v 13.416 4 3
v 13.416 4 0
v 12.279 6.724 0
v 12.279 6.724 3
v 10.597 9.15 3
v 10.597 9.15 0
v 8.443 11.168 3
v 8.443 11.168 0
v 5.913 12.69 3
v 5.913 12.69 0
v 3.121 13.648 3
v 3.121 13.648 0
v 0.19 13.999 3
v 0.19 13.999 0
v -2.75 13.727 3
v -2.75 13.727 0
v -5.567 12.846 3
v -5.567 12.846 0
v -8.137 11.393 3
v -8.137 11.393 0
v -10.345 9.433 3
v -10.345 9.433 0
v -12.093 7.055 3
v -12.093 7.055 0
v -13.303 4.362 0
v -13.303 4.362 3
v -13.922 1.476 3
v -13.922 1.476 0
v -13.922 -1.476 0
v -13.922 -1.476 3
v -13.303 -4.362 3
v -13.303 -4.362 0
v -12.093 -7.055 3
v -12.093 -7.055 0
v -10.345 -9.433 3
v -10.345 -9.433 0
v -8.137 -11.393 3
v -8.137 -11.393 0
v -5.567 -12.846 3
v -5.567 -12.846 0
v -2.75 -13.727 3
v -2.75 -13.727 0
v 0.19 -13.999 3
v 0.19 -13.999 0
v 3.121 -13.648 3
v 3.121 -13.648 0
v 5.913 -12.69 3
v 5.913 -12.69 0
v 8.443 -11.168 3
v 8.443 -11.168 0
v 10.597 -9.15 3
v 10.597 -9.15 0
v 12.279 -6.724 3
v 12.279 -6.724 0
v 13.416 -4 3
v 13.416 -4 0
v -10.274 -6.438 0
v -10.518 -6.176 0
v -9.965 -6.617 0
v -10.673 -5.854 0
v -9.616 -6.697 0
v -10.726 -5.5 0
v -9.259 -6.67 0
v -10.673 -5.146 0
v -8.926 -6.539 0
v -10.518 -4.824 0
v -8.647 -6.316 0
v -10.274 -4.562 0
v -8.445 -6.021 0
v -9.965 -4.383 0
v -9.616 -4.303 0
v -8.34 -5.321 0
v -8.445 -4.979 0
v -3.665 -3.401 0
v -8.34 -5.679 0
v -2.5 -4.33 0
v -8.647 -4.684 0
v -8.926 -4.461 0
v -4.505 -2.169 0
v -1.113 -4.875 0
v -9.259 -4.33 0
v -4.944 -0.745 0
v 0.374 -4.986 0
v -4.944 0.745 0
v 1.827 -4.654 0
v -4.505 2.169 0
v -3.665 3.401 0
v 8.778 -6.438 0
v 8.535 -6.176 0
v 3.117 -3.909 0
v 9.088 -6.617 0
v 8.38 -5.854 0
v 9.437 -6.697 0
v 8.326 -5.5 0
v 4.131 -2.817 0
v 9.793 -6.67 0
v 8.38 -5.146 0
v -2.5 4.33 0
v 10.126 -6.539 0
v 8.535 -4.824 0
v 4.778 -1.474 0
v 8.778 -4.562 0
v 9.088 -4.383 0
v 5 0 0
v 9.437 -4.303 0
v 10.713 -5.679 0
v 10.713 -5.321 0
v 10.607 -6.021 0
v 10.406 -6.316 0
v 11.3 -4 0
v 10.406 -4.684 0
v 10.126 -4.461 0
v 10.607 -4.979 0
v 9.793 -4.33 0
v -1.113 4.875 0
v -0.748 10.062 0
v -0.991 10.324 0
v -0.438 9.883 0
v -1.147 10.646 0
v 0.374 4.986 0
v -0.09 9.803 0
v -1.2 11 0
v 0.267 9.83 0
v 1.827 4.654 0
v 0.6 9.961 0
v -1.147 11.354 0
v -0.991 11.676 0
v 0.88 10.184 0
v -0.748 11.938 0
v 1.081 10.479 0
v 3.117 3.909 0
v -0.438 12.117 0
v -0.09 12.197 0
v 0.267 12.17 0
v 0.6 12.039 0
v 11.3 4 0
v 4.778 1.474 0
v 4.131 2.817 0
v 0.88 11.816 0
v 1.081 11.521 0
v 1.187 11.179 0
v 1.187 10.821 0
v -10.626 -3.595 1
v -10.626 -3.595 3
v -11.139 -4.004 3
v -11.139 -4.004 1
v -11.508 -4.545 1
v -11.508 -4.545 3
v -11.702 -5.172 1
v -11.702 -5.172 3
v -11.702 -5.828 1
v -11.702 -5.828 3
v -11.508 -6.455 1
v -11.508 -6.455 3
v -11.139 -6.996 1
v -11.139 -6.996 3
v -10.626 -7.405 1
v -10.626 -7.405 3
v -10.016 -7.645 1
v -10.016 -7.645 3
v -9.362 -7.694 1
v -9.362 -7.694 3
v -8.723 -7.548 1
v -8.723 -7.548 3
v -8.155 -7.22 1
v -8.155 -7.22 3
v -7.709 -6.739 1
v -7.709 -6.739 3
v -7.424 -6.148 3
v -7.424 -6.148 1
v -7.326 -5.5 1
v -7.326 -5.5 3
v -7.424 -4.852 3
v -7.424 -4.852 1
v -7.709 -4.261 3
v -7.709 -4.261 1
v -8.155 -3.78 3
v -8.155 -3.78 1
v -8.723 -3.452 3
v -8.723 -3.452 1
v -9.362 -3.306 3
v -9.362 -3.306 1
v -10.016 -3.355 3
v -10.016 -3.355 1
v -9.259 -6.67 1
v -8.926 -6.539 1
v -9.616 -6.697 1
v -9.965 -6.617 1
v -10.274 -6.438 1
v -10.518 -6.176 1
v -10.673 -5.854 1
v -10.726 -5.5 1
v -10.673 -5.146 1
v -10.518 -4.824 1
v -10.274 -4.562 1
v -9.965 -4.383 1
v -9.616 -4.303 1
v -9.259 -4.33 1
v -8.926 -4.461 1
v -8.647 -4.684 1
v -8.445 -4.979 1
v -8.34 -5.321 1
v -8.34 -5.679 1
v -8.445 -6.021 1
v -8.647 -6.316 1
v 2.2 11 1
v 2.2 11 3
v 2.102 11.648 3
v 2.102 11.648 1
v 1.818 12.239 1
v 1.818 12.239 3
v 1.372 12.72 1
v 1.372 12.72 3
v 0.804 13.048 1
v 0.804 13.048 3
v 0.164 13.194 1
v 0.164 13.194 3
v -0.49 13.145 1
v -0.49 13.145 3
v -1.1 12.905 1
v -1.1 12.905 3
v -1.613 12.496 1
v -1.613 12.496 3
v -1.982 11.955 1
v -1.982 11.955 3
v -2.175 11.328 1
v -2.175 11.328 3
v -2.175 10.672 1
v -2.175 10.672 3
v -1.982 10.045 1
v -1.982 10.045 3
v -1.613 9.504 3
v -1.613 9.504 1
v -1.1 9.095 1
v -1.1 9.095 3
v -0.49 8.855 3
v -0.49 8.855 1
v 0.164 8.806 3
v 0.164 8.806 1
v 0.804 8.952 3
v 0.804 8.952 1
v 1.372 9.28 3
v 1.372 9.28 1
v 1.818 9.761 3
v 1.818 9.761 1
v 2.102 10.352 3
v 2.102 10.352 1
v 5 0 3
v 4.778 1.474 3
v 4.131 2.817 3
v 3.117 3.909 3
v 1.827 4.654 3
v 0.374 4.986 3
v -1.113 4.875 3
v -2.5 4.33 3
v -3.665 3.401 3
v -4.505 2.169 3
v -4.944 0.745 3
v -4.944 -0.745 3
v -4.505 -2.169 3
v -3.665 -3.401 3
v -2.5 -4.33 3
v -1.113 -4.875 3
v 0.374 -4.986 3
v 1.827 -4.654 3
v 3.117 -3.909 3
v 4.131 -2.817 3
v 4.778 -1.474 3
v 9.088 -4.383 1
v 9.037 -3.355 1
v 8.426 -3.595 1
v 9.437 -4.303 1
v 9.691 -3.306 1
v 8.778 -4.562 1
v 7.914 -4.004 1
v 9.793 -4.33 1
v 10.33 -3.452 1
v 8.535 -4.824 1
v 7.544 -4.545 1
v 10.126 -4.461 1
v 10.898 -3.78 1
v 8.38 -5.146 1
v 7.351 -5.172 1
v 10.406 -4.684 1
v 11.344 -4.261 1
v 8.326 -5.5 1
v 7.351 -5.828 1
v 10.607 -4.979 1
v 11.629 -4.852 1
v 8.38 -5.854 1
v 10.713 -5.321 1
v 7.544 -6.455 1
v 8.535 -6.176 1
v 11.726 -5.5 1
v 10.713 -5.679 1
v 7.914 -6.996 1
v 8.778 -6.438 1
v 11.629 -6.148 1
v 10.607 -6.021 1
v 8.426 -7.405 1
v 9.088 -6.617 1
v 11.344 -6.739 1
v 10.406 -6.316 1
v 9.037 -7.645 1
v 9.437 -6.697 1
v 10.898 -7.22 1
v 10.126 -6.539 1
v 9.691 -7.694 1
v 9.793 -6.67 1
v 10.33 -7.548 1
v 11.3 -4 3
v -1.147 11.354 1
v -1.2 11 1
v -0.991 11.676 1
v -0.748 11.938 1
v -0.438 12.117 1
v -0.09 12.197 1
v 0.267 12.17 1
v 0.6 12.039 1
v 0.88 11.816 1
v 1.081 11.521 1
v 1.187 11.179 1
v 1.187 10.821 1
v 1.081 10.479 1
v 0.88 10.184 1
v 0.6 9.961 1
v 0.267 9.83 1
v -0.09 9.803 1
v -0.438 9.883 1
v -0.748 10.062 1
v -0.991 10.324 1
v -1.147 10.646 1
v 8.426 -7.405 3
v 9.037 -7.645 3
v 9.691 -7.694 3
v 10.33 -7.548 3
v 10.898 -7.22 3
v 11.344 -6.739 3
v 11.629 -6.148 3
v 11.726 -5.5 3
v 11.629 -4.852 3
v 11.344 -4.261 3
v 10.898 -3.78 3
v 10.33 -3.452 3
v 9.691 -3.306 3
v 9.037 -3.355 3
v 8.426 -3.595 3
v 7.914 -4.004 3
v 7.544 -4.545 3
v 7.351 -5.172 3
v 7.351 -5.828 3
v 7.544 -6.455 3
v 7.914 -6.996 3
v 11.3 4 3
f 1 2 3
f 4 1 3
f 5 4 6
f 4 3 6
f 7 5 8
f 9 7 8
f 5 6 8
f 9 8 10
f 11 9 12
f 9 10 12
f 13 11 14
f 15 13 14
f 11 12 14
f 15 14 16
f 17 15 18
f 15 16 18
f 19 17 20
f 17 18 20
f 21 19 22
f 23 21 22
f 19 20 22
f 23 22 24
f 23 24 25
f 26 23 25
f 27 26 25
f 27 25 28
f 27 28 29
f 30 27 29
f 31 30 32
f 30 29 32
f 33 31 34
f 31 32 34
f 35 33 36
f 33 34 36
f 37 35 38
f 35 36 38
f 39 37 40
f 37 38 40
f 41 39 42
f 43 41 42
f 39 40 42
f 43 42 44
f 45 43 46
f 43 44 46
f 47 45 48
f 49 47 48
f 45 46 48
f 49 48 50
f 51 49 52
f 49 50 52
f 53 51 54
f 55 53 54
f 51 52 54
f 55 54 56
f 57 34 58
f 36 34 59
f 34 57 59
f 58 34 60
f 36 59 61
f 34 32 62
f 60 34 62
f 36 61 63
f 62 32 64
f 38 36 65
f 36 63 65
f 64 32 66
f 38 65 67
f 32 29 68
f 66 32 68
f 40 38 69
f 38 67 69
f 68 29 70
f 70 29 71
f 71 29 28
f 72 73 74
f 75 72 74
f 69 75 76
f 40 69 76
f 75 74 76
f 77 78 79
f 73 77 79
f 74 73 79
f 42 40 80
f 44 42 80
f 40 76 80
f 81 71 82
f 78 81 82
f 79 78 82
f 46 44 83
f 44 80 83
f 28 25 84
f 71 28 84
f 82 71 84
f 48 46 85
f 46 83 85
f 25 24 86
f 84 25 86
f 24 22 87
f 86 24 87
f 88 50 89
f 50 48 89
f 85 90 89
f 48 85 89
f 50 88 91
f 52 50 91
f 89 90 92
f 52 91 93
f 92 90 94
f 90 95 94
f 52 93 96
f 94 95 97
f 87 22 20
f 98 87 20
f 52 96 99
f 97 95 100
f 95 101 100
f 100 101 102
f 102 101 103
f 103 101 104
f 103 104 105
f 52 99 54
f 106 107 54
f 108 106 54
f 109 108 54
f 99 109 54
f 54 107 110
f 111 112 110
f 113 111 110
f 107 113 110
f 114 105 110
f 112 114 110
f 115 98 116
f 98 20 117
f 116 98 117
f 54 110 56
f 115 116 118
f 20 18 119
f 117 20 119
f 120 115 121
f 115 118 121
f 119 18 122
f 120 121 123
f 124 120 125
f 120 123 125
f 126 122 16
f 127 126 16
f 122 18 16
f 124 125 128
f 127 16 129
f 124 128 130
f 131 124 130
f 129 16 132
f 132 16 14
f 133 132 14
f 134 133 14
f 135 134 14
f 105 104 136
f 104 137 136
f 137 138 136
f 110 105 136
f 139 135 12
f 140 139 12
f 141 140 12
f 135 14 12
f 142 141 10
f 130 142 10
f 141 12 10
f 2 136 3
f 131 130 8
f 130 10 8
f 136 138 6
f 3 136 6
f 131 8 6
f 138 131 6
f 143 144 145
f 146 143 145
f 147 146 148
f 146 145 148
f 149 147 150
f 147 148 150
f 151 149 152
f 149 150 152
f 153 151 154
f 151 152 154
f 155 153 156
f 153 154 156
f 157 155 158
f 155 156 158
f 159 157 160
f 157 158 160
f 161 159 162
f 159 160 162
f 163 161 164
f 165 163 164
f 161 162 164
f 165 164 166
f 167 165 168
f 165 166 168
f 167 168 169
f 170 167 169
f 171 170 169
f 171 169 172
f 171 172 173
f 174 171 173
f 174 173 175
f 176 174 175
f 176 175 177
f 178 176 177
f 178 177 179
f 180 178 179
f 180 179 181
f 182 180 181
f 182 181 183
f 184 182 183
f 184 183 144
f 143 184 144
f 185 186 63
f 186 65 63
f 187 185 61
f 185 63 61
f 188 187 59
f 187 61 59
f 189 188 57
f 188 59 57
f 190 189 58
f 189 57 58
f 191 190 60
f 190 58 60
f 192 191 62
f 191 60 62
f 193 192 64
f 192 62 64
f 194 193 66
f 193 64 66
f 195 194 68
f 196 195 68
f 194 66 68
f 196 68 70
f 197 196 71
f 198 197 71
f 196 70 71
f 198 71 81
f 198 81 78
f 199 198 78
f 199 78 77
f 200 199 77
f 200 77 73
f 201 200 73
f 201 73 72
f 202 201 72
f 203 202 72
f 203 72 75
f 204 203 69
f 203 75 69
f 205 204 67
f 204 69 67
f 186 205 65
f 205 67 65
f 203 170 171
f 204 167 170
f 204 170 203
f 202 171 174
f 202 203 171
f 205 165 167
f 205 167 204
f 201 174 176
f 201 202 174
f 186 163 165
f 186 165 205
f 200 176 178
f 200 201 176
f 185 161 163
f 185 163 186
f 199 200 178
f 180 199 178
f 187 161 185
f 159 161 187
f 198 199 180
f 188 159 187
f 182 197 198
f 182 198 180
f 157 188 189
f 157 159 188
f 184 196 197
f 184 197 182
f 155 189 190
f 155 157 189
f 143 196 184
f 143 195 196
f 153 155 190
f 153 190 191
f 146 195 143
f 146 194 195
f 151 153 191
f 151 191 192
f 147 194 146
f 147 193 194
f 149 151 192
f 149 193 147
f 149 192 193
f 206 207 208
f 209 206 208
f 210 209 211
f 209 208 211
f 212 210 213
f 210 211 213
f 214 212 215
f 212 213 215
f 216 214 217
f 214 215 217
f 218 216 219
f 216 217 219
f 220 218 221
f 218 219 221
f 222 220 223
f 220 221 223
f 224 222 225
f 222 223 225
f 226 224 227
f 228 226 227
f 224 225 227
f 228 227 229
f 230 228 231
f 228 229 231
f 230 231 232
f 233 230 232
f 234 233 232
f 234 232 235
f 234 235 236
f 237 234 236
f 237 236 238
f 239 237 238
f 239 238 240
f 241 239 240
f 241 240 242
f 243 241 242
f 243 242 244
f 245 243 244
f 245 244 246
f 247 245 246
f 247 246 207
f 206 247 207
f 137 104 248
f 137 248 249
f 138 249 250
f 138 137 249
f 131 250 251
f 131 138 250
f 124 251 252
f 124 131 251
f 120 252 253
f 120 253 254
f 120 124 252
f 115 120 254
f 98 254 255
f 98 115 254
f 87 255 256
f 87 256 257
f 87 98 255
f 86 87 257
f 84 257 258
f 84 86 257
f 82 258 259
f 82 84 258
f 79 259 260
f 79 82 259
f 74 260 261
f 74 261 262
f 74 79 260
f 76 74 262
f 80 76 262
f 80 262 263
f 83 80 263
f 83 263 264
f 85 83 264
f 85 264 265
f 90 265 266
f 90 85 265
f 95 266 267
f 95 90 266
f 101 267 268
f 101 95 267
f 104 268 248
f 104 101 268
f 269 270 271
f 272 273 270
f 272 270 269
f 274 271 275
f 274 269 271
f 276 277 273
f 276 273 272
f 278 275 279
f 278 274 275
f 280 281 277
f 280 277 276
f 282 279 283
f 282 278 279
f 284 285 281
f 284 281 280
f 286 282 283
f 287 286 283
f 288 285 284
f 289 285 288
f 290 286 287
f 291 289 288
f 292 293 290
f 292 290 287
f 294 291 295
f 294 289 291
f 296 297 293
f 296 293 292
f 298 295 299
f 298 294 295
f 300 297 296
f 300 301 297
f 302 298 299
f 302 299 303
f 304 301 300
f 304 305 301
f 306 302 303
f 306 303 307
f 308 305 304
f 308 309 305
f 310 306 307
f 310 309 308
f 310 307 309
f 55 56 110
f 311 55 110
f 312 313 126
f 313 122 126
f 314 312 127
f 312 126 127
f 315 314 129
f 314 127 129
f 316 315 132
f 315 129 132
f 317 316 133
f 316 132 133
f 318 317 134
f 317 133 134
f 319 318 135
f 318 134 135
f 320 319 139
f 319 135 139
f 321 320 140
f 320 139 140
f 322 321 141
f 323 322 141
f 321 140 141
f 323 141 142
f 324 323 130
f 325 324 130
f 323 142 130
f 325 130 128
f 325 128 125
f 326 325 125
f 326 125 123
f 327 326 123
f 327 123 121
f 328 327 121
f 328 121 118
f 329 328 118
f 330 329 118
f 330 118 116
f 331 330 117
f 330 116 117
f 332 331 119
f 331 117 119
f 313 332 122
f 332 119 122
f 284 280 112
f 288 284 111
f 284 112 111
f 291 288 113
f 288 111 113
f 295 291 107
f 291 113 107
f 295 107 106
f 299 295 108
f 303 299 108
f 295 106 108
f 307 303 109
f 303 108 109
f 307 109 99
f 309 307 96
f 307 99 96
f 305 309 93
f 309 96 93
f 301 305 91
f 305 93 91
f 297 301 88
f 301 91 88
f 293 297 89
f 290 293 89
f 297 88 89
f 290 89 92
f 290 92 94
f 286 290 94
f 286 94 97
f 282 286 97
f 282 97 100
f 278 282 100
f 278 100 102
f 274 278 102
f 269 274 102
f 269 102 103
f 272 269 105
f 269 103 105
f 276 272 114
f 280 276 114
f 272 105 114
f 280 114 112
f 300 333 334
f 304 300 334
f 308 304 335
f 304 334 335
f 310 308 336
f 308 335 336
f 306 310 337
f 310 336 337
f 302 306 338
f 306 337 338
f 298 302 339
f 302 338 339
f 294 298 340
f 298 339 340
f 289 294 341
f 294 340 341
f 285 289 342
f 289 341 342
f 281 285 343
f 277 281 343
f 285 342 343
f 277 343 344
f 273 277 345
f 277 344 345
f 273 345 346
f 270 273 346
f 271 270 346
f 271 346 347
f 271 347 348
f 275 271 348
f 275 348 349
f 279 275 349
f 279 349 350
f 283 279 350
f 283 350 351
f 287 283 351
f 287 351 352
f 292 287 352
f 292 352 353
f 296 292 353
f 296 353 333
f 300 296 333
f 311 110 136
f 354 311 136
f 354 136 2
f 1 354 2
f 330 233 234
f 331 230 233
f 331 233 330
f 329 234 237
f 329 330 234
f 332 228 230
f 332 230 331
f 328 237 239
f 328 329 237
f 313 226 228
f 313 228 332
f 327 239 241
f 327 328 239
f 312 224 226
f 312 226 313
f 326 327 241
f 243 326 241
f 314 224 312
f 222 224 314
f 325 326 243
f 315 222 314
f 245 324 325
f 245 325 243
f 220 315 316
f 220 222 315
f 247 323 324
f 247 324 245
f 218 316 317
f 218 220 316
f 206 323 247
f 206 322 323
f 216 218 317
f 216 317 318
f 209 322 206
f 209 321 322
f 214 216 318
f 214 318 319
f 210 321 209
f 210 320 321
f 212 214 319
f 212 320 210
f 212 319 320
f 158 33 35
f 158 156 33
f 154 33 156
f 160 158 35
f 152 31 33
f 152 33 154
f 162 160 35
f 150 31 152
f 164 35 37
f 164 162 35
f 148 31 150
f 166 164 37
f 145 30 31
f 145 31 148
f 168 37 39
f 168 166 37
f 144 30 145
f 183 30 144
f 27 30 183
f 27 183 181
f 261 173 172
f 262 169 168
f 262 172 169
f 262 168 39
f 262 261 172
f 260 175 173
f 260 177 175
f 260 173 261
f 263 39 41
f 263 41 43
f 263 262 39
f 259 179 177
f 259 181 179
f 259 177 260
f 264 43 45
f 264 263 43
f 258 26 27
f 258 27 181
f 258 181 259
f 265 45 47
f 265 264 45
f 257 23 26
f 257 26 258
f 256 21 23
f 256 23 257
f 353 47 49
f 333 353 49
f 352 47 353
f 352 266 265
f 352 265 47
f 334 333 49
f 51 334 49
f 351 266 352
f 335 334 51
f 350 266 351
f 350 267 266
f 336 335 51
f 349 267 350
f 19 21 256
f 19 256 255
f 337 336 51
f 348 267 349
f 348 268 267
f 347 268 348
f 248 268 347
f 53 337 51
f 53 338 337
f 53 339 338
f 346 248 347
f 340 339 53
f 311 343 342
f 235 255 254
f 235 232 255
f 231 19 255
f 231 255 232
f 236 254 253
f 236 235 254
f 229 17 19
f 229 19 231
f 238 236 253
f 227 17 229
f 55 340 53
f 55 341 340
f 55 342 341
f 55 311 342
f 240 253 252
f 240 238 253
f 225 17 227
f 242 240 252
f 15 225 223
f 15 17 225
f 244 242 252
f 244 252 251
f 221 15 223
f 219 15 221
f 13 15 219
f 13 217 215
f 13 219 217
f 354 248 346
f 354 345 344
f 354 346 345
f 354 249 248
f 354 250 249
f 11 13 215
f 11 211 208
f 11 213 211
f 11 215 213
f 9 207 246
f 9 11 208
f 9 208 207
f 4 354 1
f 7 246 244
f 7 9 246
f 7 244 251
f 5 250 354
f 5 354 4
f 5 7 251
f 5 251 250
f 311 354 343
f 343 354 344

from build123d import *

# Parameters (mm, degrees)
F0_R            = 5
F1_DEPTH        = 3
F3_D            = 2.4
F3_CBORE_D      = 4.4
F3_CBORE_DEPTH  = 2
F3_COPIES_COUNT = 3


# Not quite as in the source:
# - a pattern or mirror of a feature is missing from the dataset's text; its kind, count and spacing are read off the source's solid


with BuildPart() as f1:
    # F0 (on Top) → F1 (new body)
    with BuildSketch(Plane.XY):
        with BuildLine():
            Line((11.3, 4), (13.416407865, 4))
            ThreePointArc((13.416407865, 4), (-14, 0), (13.416407865, -4))
            Line((13.416407865, -4), (11.3, -4))
            Line((11.3, -4), (11.3, 4))
        make_face()
        Circle(F0_R, mode=Mode.SUBTRACT)
    extrude(amount=F1_DEPTH)

    # F3 (through all)
    with Locations(Plane.XY.offset(3)):
        with Locations((0, 11)):
            f3 = CounterBoreHole(F3_D / 2, F3_CBORE_D / 2, F3_CBORE_DEPTH)

    # F3_copies: F3 ×3 about axis
    f3_copies_axis = Axis((0, 0, 0), (0, 0, 1))
    for i in range(1, F3_COPIES_COUNT):
        add(f3.rotate(f3_copies_axis, i * 360 / F3_COPIES_COUNT), mode=Mode.SUBTRACT)


solid = f1.part
